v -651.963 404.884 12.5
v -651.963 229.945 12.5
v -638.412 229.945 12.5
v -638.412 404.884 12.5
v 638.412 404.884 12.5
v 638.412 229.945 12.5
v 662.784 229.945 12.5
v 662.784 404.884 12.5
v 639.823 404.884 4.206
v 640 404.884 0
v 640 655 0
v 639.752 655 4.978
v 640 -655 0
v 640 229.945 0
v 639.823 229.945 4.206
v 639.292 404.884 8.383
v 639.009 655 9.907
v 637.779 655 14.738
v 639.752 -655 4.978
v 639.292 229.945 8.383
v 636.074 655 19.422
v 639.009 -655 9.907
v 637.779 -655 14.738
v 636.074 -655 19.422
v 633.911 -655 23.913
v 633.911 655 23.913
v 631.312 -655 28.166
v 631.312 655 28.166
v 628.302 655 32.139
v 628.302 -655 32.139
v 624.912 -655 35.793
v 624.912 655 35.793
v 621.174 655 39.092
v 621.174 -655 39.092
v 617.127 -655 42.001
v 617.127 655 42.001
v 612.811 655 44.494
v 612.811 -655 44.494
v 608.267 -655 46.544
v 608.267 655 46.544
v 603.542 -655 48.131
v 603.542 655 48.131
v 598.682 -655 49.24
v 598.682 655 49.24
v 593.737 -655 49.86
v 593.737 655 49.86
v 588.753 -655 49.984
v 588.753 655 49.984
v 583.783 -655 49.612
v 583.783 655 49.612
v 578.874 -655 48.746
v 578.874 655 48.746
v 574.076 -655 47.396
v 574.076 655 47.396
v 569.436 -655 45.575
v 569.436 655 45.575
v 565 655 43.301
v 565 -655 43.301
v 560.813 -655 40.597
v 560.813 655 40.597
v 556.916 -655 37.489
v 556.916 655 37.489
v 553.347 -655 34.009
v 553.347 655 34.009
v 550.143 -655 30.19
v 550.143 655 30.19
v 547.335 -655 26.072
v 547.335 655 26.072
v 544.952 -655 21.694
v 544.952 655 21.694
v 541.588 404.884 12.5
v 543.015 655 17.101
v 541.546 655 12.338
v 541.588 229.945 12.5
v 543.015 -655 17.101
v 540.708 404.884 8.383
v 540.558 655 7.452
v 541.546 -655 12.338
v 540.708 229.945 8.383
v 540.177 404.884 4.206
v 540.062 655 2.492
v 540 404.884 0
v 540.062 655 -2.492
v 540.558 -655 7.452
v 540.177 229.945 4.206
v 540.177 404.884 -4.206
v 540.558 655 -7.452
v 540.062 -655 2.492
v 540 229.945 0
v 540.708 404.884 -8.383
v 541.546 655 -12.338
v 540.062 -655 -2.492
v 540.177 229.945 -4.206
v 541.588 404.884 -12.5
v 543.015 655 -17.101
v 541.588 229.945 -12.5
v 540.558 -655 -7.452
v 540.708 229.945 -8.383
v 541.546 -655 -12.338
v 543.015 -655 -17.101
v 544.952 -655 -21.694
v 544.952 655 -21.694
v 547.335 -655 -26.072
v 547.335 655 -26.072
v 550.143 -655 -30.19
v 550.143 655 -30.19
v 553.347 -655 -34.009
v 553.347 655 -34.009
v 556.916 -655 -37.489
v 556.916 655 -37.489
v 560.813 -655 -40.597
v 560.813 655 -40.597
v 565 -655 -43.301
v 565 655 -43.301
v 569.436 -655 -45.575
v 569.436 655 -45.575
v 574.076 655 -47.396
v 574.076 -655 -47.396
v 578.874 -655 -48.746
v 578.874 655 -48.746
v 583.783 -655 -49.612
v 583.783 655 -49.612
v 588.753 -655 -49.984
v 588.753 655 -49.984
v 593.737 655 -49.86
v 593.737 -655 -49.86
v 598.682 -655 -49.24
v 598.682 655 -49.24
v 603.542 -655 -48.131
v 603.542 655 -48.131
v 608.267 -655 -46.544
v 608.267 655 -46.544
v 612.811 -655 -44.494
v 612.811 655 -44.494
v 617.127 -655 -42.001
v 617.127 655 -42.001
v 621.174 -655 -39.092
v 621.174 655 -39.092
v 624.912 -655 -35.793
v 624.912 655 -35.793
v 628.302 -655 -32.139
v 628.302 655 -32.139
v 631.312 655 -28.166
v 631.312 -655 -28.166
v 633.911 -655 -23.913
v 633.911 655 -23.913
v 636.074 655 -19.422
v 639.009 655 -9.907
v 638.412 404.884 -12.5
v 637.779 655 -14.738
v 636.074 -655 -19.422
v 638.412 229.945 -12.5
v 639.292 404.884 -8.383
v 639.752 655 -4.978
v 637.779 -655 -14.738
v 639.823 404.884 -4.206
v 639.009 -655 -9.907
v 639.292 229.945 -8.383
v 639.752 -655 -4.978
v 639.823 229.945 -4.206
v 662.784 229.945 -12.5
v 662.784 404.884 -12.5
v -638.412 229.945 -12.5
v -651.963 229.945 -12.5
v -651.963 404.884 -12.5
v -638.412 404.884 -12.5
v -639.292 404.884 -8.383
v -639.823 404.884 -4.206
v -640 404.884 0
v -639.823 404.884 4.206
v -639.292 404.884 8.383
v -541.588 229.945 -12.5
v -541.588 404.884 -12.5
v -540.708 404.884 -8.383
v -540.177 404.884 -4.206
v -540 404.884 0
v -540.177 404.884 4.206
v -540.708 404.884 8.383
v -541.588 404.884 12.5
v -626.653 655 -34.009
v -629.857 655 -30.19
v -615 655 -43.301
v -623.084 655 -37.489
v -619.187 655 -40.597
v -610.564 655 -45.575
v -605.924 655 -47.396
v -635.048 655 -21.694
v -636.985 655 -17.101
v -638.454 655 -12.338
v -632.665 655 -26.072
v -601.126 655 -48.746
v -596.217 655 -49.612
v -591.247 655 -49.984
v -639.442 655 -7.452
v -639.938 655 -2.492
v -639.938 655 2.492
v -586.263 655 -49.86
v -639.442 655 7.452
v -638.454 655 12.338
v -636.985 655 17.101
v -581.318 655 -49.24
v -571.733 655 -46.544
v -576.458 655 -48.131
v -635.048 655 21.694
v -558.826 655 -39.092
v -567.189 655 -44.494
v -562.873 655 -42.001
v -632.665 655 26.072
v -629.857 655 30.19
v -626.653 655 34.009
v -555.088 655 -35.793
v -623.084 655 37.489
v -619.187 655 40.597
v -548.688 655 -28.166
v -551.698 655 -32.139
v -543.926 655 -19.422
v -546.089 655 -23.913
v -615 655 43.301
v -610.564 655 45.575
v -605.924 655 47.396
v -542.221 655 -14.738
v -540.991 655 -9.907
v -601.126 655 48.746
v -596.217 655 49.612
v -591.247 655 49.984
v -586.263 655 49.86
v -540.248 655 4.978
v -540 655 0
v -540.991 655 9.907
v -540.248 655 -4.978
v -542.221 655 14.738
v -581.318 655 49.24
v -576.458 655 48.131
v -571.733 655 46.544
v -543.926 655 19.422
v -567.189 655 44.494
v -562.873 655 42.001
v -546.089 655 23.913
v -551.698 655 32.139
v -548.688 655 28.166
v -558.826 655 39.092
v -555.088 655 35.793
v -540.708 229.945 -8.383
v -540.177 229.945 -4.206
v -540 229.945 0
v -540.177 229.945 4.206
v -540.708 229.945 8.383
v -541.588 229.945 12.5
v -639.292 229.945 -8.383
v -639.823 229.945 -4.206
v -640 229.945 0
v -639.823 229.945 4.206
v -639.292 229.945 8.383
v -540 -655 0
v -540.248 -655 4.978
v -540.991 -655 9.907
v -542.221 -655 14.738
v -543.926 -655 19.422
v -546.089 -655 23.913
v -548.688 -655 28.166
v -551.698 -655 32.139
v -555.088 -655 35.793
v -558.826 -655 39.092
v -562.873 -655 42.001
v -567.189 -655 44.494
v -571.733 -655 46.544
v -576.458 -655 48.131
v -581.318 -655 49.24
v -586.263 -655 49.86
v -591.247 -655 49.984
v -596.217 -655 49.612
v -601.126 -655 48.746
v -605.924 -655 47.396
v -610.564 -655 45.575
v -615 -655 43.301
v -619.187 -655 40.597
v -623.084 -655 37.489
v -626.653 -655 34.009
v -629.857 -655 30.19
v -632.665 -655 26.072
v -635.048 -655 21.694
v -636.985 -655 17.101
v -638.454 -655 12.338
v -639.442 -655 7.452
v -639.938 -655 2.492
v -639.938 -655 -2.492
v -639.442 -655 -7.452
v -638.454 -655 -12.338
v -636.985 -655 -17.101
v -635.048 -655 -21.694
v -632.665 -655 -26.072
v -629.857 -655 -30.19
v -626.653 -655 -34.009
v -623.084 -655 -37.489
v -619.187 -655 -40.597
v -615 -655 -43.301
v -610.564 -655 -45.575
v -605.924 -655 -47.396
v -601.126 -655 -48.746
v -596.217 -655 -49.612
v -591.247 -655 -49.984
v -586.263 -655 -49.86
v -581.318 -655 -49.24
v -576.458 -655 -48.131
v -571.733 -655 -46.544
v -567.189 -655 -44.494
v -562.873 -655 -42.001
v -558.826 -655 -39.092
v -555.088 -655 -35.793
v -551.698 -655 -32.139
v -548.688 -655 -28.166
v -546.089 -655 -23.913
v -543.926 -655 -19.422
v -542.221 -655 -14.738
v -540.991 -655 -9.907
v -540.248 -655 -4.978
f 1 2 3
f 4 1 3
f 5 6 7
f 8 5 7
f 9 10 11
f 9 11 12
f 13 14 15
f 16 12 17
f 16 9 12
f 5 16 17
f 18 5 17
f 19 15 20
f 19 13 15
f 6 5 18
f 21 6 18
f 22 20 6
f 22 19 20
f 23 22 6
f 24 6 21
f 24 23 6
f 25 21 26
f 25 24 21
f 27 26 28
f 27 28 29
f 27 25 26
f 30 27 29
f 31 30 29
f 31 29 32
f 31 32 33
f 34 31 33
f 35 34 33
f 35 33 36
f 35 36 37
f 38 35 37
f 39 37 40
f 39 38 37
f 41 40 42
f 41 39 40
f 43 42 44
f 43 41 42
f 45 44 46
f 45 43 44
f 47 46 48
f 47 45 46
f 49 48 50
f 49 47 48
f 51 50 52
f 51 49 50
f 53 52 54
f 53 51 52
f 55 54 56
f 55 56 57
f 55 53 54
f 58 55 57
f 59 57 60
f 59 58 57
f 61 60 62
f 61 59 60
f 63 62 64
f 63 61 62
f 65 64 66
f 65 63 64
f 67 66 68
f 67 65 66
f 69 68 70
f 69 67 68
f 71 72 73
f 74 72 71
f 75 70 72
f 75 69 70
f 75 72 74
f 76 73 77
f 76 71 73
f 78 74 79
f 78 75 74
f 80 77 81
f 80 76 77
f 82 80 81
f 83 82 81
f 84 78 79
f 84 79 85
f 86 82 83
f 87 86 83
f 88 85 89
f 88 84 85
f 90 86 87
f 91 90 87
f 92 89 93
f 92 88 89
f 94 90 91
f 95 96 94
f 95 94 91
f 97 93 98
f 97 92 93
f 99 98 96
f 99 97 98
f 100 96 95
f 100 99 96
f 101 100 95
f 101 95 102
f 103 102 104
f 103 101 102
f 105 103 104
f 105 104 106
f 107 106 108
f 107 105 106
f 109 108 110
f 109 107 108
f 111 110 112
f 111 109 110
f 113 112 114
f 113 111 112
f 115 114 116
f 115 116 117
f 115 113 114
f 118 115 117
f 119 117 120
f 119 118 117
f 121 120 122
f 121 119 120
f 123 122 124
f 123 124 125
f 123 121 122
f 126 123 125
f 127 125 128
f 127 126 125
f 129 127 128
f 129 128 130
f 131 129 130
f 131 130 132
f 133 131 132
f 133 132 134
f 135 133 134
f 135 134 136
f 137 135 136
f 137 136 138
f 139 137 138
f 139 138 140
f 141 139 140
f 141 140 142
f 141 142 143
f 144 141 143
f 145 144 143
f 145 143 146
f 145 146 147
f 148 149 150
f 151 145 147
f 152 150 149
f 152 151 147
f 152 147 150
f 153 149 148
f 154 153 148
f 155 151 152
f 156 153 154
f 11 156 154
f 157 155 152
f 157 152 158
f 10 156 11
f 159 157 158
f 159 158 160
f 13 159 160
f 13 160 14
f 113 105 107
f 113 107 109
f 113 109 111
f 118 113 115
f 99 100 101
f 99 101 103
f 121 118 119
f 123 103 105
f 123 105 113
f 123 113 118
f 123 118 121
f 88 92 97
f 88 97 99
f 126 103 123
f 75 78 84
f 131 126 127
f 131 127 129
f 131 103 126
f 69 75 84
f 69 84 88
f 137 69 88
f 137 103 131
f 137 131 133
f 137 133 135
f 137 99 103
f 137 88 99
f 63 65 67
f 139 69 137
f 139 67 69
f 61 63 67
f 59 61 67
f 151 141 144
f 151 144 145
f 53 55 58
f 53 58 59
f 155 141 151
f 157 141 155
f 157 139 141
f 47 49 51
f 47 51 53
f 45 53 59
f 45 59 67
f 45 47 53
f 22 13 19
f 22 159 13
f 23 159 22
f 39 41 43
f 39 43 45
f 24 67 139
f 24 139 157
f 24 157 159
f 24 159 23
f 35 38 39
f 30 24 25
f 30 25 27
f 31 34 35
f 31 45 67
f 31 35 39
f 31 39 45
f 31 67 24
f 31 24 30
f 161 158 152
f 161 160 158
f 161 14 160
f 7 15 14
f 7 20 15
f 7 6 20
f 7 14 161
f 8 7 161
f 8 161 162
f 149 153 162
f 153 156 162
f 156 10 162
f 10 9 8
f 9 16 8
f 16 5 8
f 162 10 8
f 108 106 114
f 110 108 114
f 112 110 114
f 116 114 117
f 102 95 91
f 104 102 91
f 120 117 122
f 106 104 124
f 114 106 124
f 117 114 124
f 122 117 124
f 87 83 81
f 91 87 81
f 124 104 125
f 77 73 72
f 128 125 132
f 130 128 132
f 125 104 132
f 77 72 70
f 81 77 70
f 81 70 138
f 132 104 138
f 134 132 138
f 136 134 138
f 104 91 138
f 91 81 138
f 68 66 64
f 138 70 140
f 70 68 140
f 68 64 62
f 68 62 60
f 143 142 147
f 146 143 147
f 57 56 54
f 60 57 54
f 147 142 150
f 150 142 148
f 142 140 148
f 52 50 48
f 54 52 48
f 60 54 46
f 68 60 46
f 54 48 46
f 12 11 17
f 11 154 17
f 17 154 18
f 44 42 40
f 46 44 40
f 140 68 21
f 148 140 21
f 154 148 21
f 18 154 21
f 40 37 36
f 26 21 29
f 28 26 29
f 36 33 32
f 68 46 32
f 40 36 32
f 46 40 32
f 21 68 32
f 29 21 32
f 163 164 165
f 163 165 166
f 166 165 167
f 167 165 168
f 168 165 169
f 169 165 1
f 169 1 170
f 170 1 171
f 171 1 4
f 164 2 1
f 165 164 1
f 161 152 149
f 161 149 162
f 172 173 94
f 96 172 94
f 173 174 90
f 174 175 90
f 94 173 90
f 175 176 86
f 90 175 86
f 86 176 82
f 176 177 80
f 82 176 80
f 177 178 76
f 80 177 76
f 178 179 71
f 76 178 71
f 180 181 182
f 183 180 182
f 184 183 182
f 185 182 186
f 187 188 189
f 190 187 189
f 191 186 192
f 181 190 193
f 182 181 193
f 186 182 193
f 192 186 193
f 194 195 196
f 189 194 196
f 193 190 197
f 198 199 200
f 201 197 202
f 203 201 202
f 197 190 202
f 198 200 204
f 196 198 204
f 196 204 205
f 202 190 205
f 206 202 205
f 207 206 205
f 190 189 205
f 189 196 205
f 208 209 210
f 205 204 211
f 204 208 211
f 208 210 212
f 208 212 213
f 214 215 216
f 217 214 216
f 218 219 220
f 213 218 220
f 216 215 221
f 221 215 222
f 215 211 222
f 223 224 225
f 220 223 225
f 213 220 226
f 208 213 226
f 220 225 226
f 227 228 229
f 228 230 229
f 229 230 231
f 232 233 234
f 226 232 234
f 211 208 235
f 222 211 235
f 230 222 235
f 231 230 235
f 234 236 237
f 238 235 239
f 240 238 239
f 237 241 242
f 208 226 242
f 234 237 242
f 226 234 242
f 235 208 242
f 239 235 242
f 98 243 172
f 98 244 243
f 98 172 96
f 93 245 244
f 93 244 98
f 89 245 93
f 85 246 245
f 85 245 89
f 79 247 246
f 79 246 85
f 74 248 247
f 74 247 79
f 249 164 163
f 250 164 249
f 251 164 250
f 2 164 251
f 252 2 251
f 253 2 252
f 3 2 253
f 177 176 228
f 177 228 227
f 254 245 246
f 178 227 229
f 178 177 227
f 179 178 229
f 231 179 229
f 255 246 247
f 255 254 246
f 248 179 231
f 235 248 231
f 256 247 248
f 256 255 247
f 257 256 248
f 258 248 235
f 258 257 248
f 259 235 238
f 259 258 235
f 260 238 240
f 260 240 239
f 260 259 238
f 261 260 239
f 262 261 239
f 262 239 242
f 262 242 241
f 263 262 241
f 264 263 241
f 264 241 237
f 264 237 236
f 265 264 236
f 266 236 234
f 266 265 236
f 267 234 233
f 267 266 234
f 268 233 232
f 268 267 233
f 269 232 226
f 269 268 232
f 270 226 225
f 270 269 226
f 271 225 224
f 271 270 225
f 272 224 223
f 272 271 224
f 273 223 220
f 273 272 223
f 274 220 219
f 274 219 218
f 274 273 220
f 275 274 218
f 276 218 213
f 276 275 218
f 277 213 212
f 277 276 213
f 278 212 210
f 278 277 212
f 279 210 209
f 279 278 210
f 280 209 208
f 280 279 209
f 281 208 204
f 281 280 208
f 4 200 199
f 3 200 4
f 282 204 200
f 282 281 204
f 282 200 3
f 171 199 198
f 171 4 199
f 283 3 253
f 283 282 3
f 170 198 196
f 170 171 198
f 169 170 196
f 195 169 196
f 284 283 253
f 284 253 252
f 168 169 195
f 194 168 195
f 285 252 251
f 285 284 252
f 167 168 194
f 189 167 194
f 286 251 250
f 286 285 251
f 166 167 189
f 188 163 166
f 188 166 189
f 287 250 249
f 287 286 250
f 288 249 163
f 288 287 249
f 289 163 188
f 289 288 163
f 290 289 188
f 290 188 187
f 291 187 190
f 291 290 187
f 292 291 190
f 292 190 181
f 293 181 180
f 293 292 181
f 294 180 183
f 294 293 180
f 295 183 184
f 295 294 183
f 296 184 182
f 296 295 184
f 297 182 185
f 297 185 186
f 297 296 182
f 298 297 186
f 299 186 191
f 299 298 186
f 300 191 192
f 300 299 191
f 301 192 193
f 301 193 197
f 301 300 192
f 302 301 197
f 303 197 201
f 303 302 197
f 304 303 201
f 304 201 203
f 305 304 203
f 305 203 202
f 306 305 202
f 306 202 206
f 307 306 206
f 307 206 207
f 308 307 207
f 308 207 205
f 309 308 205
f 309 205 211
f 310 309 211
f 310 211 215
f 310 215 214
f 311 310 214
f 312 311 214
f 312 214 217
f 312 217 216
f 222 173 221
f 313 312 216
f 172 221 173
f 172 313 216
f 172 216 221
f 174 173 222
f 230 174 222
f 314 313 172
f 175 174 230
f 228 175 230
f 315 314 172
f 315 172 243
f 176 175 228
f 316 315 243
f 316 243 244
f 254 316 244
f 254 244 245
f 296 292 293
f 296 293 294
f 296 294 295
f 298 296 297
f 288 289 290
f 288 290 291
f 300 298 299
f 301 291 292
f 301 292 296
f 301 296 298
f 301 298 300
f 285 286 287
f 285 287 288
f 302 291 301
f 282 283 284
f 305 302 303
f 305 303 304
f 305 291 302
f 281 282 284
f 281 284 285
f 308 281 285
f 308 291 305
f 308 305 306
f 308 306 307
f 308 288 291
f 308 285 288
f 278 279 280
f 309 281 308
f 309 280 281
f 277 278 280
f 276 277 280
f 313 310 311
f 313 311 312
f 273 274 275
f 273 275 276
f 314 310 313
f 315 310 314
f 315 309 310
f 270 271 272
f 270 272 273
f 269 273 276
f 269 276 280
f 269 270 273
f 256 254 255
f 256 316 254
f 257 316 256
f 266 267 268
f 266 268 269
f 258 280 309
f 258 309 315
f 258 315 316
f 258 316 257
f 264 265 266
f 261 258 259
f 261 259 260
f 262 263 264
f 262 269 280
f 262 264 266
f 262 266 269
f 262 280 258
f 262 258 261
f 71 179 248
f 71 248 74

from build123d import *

# Parameters (mm, degrees)
F0_R     = 50
F1_DEPTH = 655
F2_W     = 1314.7466778755
F2_H     = 174.9388724566
F3_DEPTH = 12.5


with BuildPart() as f1:
    # F0 (on Front) → F1 (new body, symmetric)
    with BuildSketch(Plane.XZ):
        with Locations((590, 0)):
            Circle(F0_R)
    extrude(amount=F1_DEPTH, both=True)



with BuildPart() as f1b:
    # F0 (on Front) → F1, piece 2 (new body, symmetric)
    with BuildSketch(Plane.XZ):
        with Locations((-590, 0)):
            Circle(F0_R)
    extrude(amount=F1_DEPTH, both=True)


with BuildPart() as f1_1:
    add(f1.part)

    add(f1b.part)  # F3 merges F1b
    # F2 (on Top) → F3 (join, symmetric)
    with BuildSketch(Plane.XY):
        with Locations((5.4104626179, 317.414842546)):
            Rectangle(F2_W, F2_H)
    extrude(amount=F3_DEPTH, both=True)


solid = f1_1.part
